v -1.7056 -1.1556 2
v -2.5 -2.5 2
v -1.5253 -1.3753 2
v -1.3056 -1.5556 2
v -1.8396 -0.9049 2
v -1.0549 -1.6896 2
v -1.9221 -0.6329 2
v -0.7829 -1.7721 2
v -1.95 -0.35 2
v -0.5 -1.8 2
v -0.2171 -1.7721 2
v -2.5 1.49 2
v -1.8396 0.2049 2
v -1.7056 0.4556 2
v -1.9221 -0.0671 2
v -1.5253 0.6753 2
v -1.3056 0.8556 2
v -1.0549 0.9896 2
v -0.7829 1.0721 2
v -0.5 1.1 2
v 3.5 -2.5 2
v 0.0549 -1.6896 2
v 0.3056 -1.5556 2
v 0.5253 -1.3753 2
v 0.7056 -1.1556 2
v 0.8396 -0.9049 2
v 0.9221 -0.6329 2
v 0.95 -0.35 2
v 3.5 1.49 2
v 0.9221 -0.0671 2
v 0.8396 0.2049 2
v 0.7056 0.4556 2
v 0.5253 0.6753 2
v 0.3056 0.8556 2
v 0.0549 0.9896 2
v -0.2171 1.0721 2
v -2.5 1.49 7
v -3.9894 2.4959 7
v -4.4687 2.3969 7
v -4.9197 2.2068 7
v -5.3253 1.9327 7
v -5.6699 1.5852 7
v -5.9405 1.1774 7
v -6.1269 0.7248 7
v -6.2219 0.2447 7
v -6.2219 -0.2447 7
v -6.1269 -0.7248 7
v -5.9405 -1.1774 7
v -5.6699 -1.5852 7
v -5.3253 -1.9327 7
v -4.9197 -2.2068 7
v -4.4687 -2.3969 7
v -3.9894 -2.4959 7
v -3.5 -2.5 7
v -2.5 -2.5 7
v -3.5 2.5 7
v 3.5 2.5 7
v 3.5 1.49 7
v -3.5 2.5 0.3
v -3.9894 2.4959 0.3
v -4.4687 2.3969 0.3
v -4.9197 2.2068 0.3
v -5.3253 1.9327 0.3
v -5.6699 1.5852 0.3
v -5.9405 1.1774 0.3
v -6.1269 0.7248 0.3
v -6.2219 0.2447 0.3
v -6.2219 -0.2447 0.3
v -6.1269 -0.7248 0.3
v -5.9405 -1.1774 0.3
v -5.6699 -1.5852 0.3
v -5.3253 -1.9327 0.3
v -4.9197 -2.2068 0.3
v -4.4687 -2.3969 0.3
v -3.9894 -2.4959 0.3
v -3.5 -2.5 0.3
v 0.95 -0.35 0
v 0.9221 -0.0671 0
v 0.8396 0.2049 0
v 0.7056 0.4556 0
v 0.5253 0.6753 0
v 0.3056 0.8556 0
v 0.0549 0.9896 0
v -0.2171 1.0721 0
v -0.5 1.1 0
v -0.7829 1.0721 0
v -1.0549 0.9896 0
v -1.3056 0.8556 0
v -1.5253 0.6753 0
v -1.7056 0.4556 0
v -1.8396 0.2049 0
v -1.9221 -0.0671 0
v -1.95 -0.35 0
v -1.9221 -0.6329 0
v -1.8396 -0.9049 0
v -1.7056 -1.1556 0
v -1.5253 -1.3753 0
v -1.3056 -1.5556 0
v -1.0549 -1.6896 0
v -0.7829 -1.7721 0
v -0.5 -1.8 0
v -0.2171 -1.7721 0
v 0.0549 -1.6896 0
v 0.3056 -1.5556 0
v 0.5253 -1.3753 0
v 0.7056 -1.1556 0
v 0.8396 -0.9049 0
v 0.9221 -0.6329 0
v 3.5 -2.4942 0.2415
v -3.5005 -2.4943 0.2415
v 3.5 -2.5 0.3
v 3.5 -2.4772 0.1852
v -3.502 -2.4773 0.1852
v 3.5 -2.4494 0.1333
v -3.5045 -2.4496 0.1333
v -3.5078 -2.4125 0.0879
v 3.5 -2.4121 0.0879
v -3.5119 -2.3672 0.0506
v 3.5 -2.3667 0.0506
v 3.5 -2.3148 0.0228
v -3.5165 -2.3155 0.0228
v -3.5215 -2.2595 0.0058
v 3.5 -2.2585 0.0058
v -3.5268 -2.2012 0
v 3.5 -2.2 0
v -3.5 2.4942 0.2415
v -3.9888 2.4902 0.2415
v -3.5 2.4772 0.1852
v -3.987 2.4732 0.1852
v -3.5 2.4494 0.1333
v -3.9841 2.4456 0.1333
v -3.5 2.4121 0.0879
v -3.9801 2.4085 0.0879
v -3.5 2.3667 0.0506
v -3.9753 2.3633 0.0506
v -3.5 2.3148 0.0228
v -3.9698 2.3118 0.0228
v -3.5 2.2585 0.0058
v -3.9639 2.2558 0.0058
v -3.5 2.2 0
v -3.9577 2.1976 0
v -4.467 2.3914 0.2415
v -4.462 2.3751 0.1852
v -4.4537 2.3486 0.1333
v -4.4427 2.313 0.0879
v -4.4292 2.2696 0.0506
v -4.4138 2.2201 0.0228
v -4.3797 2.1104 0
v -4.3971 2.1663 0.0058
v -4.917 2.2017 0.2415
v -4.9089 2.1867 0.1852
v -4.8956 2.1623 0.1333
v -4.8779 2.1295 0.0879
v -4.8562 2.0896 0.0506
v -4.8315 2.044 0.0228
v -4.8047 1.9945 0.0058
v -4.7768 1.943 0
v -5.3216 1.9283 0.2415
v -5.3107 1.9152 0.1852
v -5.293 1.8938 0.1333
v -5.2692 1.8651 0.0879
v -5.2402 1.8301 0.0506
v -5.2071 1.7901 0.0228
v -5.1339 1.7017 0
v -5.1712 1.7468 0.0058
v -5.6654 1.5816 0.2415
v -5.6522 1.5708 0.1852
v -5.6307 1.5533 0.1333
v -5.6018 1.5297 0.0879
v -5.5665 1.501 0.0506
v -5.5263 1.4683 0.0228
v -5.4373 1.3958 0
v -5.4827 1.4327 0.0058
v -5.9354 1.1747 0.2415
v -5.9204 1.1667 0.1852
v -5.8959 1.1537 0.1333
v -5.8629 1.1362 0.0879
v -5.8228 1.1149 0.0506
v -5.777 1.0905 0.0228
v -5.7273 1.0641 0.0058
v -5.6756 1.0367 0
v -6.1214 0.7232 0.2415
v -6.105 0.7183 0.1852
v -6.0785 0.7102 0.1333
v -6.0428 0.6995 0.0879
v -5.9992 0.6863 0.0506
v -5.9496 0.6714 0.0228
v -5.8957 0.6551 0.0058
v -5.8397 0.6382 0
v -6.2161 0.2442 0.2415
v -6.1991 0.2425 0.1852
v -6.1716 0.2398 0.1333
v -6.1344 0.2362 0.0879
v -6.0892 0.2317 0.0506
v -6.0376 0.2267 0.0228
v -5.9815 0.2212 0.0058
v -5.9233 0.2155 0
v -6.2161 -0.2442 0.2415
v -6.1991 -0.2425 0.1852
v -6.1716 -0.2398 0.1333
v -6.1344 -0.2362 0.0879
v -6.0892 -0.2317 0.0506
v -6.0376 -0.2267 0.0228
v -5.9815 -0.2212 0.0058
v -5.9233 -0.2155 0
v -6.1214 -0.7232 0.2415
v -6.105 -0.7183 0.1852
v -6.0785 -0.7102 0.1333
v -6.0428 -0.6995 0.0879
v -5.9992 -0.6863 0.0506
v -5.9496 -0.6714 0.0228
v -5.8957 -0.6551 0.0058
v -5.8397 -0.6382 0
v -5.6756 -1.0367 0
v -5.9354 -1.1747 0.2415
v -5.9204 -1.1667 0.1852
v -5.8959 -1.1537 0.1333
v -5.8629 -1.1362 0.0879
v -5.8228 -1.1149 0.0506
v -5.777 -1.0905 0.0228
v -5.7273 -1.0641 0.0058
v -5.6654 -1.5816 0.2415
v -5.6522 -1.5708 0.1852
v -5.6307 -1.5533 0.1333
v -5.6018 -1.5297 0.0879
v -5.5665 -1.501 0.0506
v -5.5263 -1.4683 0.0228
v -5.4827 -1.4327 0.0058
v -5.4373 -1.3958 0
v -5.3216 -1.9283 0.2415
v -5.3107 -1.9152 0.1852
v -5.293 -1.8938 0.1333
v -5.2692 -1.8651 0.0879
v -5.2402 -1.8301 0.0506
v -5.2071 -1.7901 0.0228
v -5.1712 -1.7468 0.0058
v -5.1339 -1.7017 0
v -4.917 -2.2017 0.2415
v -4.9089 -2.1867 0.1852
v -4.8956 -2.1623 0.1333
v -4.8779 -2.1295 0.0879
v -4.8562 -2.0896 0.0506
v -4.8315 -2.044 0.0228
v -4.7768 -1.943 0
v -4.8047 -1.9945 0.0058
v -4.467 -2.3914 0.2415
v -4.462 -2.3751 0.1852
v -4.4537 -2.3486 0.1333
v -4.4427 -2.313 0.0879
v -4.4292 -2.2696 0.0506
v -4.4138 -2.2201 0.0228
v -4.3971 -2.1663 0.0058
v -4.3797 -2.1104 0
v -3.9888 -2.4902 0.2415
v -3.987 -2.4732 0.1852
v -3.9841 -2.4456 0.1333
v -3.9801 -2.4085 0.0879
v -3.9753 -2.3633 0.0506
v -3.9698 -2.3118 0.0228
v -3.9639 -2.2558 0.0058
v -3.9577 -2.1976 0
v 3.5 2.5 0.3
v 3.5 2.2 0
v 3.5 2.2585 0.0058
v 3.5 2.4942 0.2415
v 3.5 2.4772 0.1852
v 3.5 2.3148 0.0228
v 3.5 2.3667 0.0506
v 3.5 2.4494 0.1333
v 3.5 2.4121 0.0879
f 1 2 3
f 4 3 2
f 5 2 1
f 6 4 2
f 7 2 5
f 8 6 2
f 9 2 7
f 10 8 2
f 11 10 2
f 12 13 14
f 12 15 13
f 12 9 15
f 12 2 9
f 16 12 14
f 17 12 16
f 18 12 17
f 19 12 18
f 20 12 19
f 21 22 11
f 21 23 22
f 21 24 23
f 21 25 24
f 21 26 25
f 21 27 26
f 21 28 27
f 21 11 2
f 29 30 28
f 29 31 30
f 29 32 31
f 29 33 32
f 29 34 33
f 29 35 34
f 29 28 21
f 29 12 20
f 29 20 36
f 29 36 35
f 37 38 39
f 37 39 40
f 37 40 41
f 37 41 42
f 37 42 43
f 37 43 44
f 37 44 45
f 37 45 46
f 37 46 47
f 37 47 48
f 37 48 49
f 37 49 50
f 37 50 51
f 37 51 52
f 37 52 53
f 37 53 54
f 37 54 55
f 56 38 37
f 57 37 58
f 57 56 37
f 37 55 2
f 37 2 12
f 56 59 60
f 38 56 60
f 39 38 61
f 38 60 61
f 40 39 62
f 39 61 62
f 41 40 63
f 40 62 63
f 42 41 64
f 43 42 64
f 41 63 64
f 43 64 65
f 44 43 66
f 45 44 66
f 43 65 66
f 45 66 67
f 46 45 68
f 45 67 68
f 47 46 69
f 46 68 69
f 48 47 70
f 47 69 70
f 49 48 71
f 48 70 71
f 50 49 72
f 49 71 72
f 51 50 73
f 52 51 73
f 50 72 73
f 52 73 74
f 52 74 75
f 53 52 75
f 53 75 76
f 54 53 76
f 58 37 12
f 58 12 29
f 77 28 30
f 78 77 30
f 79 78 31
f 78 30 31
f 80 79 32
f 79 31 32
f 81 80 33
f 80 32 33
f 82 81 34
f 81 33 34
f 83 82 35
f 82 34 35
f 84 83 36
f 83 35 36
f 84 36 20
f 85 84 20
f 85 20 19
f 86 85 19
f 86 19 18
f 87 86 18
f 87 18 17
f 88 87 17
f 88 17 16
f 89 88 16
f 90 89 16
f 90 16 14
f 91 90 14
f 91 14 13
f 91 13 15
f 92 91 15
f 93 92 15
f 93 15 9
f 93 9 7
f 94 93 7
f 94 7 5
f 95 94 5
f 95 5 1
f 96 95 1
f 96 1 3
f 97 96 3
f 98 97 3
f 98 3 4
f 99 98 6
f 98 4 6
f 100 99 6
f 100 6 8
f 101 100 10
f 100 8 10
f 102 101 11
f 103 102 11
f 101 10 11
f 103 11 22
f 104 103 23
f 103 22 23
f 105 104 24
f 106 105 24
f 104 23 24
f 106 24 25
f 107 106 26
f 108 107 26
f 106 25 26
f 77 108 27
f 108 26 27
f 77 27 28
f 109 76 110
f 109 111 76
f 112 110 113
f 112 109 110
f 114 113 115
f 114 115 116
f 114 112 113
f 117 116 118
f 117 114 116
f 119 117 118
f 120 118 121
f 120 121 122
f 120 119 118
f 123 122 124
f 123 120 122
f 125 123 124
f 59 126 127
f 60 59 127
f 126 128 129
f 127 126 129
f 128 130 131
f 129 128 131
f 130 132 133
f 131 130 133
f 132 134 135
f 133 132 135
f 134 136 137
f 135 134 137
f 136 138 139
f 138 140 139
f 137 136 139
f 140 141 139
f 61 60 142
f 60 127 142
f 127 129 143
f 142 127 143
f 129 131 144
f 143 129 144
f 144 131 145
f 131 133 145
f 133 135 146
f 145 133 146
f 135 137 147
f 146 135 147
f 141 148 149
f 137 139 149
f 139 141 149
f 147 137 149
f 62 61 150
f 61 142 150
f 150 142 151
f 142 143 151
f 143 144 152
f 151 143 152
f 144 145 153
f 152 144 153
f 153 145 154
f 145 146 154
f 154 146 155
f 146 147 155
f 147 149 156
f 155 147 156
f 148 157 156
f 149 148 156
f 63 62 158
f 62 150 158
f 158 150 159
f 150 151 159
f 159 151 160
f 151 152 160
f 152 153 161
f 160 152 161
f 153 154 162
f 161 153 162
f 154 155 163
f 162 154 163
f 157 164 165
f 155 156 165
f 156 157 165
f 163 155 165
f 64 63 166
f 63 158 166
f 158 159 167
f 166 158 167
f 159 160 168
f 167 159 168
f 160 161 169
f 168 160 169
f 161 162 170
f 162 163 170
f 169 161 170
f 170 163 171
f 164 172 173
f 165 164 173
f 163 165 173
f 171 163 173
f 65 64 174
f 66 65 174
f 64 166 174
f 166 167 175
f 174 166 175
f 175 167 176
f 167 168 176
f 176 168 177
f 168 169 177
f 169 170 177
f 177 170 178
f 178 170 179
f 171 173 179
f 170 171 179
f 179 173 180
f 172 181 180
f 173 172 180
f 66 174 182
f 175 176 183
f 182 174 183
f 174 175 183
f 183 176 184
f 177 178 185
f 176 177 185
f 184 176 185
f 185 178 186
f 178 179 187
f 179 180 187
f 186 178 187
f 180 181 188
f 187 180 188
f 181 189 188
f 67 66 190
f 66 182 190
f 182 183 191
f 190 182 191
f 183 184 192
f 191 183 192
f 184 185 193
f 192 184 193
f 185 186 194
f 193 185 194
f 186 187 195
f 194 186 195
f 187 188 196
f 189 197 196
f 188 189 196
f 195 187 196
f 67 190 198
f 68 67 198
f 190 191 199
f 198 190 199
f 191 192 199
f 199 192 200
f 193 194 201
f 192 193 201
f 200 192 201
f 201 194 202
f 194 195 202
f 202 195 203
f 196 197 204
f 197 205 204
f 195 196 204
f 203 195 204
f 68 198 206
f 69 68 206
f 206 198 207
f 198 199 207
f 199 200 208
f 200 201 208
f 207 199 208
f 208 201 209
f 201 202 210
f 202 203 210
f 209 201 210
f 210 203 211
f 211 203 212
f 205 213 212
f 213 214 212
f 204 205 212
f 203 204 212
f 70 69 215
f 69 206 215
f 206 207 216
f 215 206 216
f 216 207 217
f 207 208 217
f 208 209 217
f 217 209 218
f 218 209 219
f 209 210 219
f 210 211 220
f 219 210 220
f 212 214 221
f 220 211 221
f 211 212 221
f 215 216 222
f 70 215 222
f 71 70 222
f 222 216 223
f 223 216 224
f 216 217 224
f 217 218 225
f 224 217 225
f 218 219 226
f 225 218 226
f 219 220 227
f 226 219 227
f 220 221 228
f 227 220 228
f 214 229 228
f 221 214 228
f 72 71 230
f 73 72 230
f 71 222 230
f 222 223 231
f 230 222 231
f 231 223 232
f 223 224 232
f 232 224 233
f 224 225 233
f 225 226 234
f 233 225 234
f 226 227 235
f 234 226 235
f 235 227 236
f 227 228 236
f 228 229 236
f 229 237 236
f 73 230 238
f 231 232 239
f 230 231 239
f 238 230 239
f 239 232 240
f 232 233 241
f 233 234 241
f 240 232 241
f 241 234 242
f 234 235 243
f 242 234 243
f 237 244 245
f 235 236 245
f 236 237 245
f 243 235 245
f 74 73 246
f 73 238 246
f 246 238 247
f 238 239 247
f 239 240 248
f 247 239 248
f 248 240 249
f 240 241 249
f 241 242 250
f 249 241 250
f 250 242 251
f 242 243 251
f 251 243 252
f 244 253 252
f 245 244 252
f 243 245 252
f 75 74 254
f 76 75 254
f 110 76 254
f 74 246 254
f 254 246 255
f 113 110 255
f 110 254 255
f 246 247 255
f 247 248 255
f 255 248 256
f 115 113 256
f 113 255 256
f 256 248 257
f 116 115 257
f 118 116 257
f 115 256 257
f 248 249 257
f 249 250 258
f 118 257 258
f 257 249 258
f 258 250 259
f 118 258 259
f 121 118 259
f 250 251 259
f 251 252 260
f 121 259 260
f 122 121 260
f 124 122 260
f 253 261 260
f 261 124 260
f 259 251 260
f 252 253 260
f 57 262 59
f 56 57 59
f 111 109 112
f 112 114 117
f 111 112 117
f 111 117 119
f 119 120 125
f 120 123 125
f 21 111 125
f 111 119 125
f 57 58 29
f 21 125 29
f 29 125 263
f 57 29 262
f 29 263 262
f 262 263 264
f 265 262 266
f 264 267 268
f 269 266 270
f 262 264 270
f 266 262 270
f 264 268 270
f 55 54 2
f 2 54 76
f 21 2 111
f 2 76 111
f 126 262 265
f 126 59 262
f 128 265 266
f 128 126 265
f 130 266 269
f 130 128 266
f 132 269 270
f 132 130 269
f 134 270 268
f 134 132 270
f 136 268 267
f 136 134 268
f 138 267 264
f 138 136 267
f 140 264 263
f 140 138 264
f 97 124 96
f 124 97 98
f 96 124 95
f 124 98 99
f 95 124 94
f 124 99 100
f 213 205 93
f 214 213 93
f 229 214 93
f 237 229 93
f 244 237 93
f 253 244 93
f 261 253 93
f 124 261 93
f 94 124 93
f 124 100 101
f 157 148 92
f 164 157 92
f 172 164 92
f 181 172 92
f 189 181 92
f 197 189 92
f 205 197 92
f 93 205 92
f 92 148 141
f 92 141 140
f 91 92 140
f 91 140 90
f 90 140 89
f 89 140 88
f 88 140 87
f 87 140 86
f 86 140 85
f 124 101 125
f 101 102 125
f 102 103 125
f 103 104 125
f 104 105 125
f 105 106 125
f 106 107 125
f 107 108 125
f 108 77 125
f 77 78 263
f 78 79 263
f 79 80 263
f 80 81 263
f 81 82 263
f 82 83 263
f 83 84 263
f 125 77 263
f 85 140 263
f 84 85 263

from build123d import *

# Parameters (mm, degrees)
PAD_DEPTH       = 7
SKETCH001_W     = 9
SKETCH001_H     = 4.46
POCKET_DEPTH    = 5
FILLET_R        = 0.3
SKETCH002_R     = 1.45
POCKET001_DEPTH = 3


with BuildPart() as part:
    # Sketch → Pad (new body)
    with BuildSketch(Plane.XY):
        with BuildLine():
            Line((-3.5, -2.5), (3.5, -2.5))
            Line((3.5, -2.5), (3.5, 2.5))
            Line((3.5, 2.5), (-3.5, 2.5))
            ThreePointArc((-3.5, 2.5), (-6.23383, 0), (-3.5, -2.5))
        make_face()
    extrude(amount=PAD_DEPTH)

    # Sketch001 (on DatumPlane) → Pocket (cut)
    with BuildSketch(Plane.XY.offset(7)):
        with Locations((2, -0.74)):
            Rectangle(SKETCH001_W, SKETCH001_H)
    extrude(amount=-POCKET_DEPTH, mode=Mode.SUBTRACT)

    # Fillet
    fillet_edges = [part.edges().sort_by_distance(p)[0] for p in [
        (0, -2.5, 0),
    ]]
    fillet(fillet_edges, radius=FILLET_R)

    # Sketch002 (on DatumPlane) → Pocket001 (cut)
    with BuildSketch(Plane.XY.offset(2)):
        with Locations((-0.5, -0.35)):
            Circle(SKETCH002_R)
    extrude(amount=-POCKET001_DEPTH, mode=Mode.SUBTRACT)


solid = part.part
